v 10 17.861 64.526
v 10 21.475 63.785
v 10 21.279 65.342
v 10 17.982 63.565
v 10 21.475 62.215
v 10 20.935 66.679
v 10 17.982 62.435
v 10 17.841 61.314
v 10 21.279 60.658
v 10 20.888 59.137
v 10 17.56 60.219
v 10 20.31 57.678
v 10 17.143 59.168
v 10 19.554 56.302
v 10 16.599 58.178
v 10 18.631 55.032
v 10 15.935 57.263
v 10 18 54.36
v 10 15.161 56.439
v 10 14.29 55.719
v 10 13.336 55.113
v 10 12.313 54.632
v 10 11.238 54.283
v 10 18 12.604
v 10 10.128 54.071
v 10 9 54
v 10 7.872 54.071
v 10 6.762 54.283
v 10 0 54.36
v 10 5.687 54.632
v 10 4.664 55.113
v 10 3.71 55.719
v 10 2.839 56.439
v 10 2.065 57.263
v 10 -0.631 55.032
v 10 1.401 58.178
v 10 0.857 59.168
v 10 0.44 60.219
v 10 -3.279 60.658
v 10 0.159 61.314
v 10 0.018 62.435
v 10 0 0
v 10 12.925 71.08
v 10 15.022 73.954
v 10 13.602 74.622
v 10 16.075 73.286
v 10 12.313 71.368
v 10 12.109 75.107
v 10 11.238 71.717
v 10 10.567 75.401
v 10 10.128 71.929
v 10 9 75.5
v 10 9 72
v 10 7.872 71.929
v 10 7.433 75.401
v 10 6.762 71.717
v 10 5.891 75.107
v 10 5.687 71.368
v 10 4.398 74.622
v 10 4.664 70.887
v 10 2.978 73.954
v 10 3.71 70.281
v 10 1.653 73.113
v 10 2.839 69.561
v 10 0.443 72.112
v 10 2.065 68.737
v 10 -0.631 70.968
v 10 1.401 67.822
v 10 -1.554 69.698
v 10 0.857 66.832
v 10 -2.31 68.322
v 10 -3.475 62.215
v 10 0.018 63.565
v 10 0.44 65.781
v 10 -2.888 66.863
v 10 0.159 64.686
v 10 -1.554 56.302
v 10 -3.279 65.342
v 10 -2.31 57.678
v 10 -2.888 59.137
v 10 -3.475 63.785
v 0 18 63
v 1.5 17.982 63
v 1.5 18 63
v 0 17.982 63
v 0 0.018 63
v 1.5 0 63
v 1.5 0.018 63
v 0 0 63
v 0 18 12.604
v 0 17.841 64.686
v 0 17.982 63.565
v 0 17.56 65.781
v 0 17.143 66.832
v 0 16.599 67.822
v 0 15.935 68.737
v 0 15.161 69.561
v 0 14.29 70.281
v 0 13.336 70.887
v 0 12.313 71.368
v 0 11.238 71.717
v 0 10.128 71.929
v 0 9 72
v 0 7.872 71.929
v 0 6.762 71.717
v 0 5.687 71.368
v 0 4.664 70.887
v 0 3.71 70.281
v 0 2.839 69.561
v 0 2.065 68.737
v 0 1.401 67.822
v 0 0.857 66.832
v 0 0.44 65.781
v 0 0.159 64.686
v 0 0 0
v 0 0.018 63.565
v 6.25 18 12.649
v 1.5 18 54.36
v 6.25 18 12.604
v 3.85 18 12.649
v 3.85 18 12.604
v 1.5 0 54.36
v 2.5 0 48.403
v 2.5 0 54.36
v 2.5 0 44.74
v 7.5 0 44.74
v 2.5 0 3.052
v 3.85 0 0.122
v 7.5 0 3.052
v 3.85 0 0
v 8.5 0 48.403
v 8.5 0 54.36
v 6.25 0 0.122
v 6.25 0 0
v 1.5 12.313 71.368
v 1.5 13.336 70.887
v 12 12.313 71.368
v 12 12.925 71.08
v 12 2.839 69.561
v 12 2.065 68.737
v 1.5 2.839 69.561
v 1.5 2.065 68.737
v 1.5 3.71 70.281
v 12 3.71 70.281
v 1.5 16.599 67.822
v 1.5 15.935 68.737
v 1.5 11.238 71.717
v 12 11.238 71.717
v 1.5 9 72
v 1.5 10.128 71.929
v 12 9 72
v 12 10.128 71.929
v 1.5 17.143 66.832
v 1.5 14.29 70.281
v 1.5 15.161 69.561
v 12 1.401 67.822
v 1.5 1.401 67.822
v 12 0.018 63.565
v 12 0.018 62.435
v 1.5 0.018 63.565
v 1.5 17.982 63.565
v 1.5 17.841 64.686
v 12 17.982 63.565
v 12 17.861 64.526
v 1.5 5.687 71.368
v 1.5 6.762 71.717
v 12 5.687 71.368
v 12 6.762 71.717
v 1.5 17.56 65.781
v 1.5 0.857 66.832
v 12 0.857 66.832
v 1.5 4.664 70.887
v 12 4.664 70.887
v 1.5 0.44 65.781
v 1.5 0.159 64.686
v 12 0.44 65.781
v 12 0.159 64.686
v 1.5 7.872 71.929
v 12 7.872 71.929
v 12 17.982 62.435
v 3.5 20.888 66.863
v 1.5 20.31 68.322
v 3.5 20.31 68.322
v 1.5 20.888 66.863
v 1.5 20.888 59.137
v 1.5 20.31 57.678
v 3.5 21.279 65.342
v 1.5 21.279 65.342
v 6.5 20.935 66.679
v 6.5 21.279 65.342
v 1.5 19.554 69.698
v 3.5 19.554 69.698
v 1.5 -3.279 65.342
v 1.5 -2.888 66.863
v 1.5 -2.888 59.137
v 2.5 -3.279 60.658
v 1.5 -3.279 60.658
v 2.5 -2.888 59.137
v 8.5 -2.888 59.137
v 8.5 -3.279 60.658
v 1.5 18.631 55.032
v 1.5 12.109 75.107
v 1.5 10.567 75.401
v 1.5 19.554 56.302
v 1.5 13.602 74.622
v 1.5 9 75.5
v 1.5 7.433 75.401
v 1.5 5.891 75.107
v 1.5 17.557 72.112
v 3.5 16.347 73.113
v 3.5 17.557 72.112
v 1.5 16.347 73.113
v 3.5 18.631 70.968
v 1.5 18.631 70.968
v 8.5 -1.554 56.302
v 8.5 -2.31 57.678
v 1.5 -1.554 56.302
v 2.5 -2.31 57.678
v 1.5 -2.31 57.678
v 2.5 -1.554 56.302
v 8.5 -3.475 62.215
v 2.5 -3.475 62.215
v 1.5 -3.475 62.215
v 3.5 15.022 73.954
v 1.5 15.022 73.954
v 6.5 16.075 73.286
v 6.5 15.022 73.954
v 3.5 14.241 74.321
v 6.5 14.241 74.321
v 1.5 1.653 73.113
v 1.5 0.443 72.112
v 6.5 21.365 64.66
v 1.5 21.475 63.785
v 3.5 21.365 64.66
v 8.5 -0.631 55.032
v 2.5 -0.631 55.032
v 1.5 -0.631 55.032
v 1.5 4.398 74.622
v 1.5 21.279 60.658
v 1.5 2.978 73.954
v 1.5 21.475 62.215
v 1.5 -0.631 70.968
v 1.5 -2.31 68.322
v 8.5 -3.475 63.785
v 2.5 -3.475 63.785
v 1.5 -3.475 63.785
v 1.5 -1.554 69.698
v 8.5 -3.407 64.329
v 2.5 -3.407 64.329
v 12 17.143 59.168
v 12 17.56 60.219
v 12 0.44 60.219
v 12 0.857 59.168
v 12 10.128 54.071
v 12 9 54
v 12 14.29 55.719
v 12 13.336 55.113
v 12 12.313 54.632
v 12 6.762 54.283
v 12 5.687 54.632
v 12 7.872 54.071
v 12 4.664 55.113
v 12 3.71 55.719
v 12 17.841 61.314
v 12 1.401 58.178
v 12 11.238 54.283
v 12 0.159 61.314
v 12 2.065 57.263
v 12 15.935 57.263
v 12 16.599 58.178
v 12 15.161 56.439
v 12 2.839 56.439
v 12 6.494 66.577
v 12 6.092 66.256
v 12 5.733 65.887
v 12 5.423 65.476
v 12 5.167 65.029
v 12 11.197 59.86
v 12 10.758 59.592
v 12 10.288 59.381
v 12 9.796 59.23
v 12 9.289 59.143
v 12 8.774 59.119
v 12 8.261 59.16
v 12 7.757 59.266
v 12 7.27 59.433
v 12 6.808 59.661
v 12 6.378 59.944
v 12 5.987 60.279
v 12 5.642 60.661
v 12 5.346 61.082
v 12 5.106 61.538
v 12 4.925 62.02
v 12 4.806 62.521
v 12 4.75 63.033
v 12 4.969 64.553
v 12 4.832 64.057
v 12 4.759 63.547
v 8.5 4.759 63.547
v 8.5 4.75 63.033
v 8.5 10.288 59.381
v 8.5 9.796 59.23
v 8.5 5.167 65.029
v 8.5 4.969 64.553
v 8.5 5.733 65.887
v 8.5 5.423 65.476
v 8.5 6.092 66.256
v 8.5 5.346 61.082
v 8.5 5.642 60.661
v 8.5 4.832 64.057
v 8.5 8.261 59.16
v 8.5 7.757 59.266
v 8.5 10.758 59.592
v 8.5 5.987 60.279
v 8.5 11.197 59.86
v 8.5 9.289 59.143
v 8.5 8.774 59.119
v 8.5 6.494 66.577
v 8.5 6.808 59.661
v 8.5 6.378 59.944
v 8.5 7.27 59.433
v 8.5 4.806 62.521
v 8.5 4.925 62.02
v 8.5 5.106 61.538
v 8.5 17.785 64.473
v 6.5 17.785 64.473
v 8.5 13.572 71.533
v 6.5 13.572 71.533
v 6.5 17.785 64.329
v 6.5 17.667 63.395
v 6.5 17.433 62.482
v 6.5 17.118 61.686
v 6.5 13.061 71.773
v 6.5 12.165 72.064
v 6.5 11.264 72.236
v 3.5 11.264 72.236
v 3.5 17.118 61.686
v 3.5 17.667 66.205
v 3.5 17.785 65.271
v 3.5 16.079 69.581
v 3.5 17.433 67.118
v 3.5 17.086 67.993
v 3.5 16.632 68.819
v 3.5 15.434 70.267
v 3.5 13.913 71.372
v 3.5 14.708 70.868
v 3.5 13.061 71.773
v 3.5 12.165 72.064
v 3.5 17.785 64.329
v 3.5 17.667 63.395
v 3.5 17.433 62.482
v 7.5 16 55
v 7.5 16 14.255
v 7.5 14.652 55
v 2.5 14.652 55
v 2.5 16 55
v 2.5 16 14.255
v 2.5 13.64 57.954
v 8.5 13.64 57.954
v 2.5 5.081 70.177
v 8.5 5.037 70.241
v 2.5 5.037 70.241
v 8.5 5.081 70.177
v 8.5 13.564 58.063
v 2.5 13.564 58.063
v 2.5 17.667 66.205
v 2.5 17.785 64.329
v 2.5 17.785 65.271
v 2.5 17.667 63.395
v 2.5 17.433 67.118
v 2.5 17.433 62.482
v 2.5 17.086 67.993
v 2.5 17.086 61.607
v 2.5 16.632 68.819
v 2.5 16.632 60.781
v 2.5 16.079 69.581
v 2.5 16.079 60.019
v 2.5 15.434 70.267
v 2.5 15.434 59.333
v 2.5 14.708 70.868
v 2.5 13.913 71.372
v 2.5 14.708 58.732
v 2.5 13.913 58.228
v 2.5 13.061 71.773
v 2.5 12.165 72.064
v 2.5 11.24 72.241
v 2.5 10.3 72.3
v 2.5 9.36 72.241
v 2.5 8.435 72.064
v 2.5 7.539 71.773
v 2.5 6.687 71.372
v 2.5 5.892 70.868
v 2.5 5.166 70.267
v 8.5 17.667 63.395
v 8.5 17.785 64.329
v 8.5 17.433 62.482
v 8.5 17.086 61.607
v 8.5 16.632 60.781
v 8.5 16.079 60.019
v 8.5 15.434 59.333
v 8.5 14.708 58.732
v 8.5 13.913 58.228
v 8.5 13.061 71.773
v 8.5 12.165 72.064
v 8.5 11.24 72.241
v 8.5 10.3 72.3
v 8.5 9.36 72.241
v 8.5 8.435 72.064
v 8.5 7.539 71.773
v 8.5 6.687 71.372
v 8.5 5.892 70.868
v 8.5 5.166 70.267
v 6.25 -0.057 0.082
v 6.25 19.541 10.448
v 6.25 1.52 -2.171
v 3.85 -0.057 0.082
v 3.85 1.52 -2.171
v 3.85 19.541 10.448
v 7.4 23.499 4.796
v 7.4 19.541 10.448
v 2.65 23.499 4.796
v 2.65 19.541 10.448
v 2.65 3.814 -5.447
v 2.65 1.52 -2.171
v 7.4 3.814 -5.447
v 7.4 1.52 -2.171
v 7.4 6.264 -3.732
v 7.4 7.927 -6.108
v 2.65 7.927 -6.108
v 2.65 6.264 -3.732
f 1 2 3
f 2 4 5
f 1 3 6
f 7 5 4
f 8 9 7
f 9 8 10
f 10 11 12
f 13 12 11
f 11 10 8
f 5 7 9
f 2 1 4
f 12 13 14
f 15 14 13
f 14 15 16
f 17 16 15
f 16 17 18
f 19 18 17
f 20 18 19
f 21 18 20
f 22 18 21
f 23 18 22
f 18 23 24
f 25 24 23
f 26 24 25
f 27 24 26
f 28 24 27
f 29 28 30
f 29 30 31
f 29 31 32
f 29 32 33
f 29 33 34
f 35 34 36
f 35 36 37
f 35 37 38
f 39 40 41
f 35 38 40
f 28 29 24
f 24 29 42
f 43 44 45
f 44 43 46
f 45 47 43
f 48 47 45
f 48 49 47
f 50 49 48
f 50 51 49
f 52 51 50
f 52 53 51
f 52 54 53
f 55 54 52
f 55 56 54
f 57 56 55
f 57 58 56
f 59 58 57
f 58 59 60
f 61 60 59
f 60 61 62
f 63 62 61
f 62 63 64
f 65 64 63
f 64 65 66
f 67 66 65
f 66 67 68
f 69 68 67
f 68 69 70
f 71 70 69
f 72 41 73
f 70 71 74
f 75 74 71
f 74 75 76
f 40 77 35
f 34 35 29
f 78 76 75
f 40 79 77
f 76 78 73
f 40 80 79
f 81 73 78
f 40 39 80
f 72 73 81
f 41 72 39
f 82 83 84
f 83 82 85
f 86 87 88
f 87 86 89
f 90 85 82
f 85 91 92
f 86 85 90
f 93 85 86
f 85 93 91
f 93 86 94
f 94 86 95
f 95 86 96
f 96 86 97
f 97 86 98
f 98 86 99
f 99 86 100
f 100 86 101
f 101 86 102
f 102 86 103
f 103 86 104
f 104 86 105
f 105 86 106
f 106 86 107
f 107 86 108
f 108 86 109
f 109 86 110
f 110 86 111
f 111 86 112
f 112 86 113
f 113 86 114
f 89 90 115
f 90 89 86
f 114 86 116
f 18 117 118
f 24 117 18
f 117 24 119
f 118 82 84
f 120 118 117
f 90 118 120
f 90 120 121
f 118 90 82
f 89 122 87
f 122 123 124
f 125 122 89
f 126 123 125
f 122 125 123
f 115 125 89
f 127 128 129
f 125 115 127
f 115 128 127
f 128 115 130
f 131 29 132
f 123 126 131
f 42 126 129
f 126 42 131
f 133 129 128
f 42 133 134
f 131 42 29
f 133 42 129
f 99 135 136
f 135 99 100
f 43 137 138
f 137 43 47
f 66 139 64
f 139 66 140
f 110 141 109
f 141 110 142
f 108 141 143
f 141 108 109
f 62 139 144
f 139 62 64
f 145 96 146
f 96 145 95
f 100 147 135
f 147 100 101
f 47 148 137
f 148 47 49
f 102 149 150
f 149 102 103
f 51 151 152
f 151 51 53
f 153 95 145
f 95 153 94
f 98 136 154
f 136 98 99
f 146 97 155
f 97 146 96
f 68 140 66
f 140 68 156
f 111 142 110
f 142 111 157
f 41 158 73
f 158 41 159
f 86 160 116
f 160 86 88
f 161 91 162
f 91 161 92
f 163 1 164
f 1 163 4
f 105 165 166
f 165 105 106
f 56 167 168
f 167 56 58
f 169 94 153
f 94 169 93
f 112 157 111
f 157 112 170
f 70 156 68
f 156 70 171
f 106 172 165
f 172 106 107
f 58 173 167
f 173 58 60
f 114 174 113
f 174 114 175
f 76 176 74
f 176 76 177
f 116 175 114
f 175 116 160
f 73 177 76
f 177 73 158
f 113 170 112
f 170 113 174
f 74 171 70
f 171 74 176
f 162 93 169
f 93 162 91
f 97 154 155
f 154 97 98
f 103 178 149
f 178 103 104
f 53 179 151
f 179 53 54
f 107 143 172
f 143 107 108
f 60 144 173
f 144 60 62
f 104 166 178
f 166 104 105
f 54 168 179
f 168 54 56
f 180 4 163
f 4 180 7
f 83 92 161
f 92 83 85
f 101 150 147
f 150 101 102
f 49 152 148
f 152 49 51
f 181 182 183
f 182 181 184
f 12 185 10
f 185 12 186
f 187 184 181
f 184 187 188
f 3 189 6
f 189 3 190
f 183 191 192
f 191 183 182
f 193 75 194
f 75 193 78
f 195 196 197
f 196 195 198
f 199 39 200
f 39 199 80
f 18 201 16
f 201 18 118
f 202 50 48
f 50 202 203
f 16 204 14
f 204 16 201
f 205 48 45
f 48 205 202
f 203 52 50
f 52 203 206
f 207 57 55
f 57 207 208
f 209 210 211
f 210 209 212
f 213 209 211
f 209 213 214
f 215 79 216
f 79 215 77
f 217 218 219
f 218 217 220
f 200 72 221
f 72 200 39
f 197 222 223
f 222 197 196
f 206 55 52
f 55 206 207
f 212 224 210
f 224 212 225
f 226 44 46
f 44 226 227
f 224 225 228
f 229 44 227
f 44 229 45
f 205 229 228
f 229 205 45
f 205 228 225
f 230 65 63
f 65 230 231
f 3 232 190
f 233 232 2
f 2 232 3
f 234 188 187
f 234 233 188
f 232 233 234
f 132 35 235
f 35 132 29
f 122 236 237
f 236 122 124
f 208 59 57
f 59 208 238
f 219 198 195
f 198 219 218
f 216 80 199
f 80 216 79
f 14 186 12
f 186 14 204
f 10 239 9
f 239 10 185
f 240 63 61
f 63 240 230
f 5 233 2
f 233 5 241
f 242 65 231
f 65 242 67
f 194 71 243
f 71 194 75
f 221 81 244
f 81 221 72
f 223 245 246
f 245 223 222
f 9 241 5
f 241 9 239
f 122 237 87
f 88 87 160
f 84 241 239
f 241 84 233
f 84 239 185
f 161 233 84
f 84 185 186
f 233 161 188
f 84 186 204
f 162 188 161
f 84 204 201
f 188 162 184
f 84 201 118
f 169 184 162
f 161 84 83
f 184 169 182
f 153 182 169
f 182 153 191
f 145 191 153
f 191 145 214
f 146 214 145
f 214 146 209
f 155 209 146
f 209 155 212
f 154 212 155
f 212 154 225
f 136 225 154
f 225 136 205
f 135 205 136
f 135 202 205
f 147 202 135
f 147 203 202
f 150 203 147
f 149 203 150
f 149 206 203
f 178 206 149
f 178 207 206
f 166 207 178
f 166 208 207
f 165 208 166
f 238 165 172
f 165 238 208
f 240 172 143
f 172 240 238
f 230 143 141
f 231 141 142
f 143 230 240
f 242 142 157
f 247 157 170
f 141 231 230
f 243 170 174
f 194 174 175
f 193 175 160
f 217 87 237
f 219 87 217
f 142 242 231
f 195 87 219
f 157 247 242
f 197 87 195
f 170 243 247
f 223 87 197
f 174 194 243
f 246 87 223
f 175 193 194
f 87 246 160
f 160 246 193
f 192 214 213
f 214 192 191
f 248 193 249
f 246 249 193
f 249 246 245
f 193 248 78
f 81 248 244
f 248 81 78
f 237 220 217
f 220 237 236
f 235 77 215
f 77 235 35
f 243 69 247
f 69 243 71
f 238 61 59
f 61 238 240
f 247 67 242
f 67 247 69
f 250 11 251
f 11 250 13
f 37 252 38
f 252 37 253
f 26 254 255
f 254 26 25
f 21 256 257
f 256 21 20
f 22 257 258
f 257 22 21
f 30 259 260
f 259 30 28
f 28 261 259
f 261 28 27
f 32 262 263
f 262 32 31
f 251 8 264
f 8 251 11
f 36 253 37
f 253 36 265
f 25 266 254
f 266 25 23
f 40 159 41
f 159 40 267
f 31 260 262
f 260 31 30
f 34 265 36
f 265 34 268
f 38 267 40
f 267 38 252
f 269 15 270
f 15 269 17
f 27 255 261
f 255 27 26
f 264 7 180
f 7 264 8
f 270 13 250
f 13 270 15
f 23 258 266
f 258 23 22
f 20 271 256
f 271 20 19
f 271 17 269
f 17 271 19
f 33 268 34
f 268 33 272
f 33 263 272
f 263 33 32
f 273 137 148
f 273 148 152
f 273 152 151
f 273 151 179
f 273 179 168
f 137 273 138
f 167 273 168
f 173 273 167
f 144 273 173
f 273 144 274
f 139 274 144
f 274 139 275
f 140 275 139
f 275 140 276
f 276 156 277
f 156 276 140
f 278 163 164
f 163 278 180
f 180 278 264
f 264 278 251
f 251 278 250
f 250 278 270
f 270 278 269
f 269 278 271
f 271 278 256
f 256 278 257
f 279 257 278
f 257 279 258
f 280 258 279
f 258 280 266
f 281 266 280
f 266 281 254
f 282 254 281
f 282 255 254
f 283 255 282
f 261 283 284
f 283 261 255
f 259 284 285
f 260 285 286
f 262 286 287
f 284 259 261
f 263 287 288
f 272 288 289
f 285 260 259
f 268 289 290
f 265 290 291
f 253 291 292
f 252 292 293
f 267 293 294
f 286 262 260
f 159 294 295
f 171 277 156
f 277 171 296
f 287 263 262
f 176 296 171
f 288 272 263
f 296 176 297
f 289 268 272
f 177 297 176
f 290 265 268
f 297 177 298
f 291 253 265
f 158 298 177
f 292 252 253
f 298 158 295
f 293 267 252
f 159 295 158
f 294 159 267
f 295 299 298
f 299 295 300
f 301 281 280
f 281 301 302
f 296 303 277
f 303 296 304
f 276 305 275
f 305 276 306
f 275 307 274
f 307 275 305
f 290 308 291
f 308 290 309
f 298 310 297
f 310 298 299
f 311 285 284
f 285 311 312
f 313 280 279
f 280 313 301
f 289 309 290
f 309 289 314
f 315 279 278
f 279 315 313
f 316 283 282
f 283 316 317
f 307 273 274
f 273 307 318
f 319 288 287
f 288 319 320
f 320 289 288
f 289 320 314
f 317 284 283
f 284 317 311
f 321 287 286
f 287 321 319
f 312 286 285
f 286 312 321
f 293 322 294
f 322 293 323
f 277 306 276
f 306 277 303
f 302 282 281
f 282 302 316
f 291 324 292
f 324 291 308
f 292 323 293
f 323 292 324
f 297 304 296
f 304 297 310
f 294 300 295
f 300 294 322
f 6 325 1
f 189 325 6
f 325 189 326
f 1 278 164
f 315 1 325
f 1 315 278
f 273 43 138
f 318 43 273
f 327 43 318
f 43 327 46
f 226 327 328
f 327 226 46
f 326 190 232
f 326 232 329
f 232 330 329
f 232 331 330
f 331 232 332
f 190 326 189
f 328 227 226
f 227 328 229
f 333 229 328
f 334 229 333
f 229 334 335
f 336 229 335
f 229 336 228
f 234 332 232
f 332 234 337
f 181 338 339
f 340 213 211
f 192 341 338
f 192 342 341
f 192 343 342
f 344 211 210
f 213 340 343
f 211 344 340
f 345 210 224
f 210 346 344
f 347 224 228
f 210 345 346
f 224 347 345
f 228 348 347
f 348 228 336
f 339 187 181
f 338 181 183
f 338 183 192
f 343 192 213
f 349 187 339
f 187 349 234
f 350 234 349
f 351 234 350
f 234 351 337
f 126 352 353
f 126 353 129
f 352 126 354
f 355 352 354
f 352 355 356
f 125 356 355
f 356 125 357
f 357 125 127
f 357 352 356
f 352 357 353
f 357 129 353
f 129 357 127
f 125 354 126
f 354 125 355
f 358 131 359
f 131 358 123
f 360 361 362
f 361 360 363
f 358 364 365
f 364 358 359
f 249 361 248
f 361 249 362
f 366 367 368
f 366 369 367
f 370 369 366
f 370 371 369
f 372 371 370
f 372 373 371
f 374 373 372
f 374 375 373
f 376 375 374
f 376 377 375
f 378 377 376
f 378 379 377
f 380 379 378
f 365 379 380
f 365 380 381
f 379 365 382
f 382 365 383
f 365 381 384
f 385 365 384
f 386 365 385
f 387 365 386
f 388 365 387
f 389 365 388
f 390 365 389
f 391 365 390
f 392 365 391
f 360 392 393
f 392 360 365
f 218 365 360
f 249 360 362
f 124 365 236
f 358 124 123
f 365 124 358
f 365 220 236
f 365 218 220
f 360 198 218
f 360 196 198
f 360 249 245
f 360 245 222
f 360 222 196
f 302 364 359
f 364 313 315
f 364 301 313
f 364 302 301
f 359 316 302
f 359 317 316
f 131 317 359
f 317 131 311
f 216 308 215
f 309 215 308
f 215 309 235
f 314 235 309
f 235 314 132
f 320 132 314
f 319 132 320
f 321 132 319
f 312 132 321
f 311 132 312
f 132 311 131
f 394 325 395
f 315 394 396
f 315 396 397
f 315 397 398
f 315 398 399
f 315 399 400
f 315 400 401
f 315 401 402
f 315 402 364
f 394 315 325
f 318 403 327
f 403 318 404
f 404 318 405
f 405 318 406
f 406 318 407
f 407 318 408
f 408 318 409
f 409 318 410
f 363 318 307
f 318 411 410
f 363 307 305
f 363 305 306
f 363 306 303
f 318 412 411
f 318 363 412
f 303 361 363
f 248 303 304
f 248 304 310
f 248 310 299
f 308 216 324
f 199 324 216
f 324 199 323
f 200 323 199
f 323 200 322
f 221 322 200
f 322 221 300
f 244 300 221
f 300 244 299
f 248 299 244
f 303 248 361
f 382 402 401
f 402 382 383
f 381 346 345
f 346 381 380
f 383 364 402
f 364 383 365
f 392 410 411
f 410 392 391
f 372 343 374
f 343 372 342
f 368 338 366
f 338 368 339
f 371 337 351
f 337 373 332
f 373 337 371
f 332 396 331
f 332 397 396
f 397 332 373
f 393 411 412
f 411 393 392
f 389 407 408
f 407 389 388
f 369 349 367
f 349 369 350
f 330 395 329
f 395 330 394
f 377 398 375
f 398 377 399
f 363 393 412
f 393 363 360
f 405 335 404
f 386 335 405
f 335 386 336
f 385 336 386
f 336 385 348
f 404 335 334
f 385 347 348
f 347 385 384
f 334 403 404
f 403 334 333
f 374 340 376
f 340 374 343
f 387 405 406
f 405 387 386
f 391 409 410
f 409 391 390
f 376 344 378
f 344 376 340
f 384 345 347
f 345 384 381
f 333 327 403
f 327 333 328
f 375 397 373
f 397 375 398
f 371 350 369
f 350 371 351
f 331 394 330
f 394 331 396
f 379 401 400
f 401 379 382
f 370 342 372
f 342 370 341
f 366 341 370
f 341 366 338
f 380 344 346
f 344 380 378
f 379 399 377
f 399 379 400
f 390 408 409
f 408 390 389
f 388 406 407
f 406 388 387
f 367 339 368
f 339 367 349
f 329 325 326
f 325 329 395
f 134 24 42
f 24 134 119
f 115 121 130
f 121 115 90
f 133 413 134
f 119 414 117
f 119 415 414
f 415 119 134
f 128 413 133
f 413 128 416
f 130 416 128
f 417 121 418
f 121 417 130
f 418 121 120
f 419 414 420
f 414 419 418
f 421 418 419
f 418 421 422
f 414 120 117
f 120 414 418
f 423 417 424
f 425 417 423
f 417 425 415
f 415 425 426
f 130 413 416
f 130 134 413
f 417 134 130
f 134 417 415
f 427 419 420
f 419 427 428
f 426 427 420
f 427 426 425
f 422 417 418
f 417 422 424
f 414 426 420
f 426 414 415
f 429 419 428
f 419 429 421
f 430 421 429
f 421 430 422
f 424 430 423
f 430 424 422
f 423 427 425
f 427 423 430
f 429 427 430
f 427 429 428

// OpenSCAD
/*

Replacement Commodore 1520 "RSB" (Roller Shaft Bracket)

Copyright 2021 by Atkelar, free for personal, non commercial use!

If you have any improvements, let me know via comment and/or pull request.

usage: The "FullRSB" module will render a full RSB model, as it is used on the "right" side of the plotter, when seen from the front.

The "HaflRSB" module takes a boolean parameter to indicate which half (left/right) to render (or which to "cut away") from the full model. This can be used to create matching halves that can be glued together to make it easier to remove the inner supports.abs

To indicate what part to render, you can use the RenderMode variable as follows:

    0 = right side, full
    1 = left side, full
    2 = right side, right half
    3 = right side, left half
    4 = left side, left half
    5 = left side, right half

The result might need some cleaning up, depending on the print quality, but the measurements are tested with PLA and work "OK". I didn't parameterize the sizes, since it is supposed to be a drop in replacement for the existing (and possibly lost) ones.
*/

// use a high enough value to create "round" sections
$fn=50;

// Set the requested render mode
RenderMode = 0;



module FullRSB()
{
    union()
    {
        
        difference()
        {
            union() // base shape
            {
                cube([10,18,63]);
                translate([5,9,63])
                    rotate([0,90,0])
                    cylinder(d=18, h=10, center=true);
                translate([5+(1.5/2),9,63])
                    rotate([0,90,0])
                    cylinder(d=25, h=8.5, center=true);
                translate([6,9,63])
                    rotate([0,90,0])
                    cylinder(d=18, h=12, center=true);
            }
            rotate([35,0,0])    // angle
                translate([-1,0,-30])
                    cube([12,30,30], center=false);
            translate([3.5,0,49.7])
                rotate([35,0,0])
                    union()
                    {
                        cube([3,40,12],center=false);
                        translate([6,15,6])
                        rotate([0,90,0])
                        {
                            cylinder(d=8.2, h=10, center=true);
                            translate([-4.1,0,-5])
                            cube([8.2,20,30]);
                        }
                        
                    }
            difference()
            {
                translate([2.5,-2,0])
                    cube([5,18,55]);
                rotate([35,0,0])
                    translate([2,-8,-12.5])
                    cube([6,30,15]);
                translate([0,0,60])
                rotate([35,0,0])
                    translate([2,-12,-12.5])
                    cube([6,30,15]);
            }
            translate([0.5,0,60])
            {
                rotate([35,0,0])
                    translate([2,-20,-9.5])
                    cube([6,30,15]);
                    translate([5,10.3,4.8])
                rotate([0,90,0])
                    cylinder(d=15,h=6, center=true);
            }
        }
        rotate([35,0,0])    // mounting bracket
        {
            difference()
            {
                union()
                {
                    translate([3.85,0,-3.9])
                        cube([2.4,22,4], center=false);
                    translate([2.65,0,-9.55])
                        cube([4.75,22,6.9], center=false);
                }
                translate([0,-0.01,-9.65])
                    cube([10,3,3], center=false);
            }
        }
    }
}

module HalfRSB(left=true)
{
    difference()
    {
        FullRSB();
        if (left)
        {
            translate([5,-10,-30])
            cube([100,100,150]);
        }
        else
        {
            translate([-95,-10,-30])
            cube([100,100,150]);
        }
    }
}

if (RenderMode < 2)
{
    if (RenderMode <1)
    {
        FullRSB();
    } else {
        scale([-1,1,1])
            FullRSB();
    }
}
else
{
    if (RenderMode < 4)
    {
        HalfRSB(RenderMode > 2);
    } else {
        scale([-1,1,1])
            HalfRSB(RenderMode > 4);
    }
}
